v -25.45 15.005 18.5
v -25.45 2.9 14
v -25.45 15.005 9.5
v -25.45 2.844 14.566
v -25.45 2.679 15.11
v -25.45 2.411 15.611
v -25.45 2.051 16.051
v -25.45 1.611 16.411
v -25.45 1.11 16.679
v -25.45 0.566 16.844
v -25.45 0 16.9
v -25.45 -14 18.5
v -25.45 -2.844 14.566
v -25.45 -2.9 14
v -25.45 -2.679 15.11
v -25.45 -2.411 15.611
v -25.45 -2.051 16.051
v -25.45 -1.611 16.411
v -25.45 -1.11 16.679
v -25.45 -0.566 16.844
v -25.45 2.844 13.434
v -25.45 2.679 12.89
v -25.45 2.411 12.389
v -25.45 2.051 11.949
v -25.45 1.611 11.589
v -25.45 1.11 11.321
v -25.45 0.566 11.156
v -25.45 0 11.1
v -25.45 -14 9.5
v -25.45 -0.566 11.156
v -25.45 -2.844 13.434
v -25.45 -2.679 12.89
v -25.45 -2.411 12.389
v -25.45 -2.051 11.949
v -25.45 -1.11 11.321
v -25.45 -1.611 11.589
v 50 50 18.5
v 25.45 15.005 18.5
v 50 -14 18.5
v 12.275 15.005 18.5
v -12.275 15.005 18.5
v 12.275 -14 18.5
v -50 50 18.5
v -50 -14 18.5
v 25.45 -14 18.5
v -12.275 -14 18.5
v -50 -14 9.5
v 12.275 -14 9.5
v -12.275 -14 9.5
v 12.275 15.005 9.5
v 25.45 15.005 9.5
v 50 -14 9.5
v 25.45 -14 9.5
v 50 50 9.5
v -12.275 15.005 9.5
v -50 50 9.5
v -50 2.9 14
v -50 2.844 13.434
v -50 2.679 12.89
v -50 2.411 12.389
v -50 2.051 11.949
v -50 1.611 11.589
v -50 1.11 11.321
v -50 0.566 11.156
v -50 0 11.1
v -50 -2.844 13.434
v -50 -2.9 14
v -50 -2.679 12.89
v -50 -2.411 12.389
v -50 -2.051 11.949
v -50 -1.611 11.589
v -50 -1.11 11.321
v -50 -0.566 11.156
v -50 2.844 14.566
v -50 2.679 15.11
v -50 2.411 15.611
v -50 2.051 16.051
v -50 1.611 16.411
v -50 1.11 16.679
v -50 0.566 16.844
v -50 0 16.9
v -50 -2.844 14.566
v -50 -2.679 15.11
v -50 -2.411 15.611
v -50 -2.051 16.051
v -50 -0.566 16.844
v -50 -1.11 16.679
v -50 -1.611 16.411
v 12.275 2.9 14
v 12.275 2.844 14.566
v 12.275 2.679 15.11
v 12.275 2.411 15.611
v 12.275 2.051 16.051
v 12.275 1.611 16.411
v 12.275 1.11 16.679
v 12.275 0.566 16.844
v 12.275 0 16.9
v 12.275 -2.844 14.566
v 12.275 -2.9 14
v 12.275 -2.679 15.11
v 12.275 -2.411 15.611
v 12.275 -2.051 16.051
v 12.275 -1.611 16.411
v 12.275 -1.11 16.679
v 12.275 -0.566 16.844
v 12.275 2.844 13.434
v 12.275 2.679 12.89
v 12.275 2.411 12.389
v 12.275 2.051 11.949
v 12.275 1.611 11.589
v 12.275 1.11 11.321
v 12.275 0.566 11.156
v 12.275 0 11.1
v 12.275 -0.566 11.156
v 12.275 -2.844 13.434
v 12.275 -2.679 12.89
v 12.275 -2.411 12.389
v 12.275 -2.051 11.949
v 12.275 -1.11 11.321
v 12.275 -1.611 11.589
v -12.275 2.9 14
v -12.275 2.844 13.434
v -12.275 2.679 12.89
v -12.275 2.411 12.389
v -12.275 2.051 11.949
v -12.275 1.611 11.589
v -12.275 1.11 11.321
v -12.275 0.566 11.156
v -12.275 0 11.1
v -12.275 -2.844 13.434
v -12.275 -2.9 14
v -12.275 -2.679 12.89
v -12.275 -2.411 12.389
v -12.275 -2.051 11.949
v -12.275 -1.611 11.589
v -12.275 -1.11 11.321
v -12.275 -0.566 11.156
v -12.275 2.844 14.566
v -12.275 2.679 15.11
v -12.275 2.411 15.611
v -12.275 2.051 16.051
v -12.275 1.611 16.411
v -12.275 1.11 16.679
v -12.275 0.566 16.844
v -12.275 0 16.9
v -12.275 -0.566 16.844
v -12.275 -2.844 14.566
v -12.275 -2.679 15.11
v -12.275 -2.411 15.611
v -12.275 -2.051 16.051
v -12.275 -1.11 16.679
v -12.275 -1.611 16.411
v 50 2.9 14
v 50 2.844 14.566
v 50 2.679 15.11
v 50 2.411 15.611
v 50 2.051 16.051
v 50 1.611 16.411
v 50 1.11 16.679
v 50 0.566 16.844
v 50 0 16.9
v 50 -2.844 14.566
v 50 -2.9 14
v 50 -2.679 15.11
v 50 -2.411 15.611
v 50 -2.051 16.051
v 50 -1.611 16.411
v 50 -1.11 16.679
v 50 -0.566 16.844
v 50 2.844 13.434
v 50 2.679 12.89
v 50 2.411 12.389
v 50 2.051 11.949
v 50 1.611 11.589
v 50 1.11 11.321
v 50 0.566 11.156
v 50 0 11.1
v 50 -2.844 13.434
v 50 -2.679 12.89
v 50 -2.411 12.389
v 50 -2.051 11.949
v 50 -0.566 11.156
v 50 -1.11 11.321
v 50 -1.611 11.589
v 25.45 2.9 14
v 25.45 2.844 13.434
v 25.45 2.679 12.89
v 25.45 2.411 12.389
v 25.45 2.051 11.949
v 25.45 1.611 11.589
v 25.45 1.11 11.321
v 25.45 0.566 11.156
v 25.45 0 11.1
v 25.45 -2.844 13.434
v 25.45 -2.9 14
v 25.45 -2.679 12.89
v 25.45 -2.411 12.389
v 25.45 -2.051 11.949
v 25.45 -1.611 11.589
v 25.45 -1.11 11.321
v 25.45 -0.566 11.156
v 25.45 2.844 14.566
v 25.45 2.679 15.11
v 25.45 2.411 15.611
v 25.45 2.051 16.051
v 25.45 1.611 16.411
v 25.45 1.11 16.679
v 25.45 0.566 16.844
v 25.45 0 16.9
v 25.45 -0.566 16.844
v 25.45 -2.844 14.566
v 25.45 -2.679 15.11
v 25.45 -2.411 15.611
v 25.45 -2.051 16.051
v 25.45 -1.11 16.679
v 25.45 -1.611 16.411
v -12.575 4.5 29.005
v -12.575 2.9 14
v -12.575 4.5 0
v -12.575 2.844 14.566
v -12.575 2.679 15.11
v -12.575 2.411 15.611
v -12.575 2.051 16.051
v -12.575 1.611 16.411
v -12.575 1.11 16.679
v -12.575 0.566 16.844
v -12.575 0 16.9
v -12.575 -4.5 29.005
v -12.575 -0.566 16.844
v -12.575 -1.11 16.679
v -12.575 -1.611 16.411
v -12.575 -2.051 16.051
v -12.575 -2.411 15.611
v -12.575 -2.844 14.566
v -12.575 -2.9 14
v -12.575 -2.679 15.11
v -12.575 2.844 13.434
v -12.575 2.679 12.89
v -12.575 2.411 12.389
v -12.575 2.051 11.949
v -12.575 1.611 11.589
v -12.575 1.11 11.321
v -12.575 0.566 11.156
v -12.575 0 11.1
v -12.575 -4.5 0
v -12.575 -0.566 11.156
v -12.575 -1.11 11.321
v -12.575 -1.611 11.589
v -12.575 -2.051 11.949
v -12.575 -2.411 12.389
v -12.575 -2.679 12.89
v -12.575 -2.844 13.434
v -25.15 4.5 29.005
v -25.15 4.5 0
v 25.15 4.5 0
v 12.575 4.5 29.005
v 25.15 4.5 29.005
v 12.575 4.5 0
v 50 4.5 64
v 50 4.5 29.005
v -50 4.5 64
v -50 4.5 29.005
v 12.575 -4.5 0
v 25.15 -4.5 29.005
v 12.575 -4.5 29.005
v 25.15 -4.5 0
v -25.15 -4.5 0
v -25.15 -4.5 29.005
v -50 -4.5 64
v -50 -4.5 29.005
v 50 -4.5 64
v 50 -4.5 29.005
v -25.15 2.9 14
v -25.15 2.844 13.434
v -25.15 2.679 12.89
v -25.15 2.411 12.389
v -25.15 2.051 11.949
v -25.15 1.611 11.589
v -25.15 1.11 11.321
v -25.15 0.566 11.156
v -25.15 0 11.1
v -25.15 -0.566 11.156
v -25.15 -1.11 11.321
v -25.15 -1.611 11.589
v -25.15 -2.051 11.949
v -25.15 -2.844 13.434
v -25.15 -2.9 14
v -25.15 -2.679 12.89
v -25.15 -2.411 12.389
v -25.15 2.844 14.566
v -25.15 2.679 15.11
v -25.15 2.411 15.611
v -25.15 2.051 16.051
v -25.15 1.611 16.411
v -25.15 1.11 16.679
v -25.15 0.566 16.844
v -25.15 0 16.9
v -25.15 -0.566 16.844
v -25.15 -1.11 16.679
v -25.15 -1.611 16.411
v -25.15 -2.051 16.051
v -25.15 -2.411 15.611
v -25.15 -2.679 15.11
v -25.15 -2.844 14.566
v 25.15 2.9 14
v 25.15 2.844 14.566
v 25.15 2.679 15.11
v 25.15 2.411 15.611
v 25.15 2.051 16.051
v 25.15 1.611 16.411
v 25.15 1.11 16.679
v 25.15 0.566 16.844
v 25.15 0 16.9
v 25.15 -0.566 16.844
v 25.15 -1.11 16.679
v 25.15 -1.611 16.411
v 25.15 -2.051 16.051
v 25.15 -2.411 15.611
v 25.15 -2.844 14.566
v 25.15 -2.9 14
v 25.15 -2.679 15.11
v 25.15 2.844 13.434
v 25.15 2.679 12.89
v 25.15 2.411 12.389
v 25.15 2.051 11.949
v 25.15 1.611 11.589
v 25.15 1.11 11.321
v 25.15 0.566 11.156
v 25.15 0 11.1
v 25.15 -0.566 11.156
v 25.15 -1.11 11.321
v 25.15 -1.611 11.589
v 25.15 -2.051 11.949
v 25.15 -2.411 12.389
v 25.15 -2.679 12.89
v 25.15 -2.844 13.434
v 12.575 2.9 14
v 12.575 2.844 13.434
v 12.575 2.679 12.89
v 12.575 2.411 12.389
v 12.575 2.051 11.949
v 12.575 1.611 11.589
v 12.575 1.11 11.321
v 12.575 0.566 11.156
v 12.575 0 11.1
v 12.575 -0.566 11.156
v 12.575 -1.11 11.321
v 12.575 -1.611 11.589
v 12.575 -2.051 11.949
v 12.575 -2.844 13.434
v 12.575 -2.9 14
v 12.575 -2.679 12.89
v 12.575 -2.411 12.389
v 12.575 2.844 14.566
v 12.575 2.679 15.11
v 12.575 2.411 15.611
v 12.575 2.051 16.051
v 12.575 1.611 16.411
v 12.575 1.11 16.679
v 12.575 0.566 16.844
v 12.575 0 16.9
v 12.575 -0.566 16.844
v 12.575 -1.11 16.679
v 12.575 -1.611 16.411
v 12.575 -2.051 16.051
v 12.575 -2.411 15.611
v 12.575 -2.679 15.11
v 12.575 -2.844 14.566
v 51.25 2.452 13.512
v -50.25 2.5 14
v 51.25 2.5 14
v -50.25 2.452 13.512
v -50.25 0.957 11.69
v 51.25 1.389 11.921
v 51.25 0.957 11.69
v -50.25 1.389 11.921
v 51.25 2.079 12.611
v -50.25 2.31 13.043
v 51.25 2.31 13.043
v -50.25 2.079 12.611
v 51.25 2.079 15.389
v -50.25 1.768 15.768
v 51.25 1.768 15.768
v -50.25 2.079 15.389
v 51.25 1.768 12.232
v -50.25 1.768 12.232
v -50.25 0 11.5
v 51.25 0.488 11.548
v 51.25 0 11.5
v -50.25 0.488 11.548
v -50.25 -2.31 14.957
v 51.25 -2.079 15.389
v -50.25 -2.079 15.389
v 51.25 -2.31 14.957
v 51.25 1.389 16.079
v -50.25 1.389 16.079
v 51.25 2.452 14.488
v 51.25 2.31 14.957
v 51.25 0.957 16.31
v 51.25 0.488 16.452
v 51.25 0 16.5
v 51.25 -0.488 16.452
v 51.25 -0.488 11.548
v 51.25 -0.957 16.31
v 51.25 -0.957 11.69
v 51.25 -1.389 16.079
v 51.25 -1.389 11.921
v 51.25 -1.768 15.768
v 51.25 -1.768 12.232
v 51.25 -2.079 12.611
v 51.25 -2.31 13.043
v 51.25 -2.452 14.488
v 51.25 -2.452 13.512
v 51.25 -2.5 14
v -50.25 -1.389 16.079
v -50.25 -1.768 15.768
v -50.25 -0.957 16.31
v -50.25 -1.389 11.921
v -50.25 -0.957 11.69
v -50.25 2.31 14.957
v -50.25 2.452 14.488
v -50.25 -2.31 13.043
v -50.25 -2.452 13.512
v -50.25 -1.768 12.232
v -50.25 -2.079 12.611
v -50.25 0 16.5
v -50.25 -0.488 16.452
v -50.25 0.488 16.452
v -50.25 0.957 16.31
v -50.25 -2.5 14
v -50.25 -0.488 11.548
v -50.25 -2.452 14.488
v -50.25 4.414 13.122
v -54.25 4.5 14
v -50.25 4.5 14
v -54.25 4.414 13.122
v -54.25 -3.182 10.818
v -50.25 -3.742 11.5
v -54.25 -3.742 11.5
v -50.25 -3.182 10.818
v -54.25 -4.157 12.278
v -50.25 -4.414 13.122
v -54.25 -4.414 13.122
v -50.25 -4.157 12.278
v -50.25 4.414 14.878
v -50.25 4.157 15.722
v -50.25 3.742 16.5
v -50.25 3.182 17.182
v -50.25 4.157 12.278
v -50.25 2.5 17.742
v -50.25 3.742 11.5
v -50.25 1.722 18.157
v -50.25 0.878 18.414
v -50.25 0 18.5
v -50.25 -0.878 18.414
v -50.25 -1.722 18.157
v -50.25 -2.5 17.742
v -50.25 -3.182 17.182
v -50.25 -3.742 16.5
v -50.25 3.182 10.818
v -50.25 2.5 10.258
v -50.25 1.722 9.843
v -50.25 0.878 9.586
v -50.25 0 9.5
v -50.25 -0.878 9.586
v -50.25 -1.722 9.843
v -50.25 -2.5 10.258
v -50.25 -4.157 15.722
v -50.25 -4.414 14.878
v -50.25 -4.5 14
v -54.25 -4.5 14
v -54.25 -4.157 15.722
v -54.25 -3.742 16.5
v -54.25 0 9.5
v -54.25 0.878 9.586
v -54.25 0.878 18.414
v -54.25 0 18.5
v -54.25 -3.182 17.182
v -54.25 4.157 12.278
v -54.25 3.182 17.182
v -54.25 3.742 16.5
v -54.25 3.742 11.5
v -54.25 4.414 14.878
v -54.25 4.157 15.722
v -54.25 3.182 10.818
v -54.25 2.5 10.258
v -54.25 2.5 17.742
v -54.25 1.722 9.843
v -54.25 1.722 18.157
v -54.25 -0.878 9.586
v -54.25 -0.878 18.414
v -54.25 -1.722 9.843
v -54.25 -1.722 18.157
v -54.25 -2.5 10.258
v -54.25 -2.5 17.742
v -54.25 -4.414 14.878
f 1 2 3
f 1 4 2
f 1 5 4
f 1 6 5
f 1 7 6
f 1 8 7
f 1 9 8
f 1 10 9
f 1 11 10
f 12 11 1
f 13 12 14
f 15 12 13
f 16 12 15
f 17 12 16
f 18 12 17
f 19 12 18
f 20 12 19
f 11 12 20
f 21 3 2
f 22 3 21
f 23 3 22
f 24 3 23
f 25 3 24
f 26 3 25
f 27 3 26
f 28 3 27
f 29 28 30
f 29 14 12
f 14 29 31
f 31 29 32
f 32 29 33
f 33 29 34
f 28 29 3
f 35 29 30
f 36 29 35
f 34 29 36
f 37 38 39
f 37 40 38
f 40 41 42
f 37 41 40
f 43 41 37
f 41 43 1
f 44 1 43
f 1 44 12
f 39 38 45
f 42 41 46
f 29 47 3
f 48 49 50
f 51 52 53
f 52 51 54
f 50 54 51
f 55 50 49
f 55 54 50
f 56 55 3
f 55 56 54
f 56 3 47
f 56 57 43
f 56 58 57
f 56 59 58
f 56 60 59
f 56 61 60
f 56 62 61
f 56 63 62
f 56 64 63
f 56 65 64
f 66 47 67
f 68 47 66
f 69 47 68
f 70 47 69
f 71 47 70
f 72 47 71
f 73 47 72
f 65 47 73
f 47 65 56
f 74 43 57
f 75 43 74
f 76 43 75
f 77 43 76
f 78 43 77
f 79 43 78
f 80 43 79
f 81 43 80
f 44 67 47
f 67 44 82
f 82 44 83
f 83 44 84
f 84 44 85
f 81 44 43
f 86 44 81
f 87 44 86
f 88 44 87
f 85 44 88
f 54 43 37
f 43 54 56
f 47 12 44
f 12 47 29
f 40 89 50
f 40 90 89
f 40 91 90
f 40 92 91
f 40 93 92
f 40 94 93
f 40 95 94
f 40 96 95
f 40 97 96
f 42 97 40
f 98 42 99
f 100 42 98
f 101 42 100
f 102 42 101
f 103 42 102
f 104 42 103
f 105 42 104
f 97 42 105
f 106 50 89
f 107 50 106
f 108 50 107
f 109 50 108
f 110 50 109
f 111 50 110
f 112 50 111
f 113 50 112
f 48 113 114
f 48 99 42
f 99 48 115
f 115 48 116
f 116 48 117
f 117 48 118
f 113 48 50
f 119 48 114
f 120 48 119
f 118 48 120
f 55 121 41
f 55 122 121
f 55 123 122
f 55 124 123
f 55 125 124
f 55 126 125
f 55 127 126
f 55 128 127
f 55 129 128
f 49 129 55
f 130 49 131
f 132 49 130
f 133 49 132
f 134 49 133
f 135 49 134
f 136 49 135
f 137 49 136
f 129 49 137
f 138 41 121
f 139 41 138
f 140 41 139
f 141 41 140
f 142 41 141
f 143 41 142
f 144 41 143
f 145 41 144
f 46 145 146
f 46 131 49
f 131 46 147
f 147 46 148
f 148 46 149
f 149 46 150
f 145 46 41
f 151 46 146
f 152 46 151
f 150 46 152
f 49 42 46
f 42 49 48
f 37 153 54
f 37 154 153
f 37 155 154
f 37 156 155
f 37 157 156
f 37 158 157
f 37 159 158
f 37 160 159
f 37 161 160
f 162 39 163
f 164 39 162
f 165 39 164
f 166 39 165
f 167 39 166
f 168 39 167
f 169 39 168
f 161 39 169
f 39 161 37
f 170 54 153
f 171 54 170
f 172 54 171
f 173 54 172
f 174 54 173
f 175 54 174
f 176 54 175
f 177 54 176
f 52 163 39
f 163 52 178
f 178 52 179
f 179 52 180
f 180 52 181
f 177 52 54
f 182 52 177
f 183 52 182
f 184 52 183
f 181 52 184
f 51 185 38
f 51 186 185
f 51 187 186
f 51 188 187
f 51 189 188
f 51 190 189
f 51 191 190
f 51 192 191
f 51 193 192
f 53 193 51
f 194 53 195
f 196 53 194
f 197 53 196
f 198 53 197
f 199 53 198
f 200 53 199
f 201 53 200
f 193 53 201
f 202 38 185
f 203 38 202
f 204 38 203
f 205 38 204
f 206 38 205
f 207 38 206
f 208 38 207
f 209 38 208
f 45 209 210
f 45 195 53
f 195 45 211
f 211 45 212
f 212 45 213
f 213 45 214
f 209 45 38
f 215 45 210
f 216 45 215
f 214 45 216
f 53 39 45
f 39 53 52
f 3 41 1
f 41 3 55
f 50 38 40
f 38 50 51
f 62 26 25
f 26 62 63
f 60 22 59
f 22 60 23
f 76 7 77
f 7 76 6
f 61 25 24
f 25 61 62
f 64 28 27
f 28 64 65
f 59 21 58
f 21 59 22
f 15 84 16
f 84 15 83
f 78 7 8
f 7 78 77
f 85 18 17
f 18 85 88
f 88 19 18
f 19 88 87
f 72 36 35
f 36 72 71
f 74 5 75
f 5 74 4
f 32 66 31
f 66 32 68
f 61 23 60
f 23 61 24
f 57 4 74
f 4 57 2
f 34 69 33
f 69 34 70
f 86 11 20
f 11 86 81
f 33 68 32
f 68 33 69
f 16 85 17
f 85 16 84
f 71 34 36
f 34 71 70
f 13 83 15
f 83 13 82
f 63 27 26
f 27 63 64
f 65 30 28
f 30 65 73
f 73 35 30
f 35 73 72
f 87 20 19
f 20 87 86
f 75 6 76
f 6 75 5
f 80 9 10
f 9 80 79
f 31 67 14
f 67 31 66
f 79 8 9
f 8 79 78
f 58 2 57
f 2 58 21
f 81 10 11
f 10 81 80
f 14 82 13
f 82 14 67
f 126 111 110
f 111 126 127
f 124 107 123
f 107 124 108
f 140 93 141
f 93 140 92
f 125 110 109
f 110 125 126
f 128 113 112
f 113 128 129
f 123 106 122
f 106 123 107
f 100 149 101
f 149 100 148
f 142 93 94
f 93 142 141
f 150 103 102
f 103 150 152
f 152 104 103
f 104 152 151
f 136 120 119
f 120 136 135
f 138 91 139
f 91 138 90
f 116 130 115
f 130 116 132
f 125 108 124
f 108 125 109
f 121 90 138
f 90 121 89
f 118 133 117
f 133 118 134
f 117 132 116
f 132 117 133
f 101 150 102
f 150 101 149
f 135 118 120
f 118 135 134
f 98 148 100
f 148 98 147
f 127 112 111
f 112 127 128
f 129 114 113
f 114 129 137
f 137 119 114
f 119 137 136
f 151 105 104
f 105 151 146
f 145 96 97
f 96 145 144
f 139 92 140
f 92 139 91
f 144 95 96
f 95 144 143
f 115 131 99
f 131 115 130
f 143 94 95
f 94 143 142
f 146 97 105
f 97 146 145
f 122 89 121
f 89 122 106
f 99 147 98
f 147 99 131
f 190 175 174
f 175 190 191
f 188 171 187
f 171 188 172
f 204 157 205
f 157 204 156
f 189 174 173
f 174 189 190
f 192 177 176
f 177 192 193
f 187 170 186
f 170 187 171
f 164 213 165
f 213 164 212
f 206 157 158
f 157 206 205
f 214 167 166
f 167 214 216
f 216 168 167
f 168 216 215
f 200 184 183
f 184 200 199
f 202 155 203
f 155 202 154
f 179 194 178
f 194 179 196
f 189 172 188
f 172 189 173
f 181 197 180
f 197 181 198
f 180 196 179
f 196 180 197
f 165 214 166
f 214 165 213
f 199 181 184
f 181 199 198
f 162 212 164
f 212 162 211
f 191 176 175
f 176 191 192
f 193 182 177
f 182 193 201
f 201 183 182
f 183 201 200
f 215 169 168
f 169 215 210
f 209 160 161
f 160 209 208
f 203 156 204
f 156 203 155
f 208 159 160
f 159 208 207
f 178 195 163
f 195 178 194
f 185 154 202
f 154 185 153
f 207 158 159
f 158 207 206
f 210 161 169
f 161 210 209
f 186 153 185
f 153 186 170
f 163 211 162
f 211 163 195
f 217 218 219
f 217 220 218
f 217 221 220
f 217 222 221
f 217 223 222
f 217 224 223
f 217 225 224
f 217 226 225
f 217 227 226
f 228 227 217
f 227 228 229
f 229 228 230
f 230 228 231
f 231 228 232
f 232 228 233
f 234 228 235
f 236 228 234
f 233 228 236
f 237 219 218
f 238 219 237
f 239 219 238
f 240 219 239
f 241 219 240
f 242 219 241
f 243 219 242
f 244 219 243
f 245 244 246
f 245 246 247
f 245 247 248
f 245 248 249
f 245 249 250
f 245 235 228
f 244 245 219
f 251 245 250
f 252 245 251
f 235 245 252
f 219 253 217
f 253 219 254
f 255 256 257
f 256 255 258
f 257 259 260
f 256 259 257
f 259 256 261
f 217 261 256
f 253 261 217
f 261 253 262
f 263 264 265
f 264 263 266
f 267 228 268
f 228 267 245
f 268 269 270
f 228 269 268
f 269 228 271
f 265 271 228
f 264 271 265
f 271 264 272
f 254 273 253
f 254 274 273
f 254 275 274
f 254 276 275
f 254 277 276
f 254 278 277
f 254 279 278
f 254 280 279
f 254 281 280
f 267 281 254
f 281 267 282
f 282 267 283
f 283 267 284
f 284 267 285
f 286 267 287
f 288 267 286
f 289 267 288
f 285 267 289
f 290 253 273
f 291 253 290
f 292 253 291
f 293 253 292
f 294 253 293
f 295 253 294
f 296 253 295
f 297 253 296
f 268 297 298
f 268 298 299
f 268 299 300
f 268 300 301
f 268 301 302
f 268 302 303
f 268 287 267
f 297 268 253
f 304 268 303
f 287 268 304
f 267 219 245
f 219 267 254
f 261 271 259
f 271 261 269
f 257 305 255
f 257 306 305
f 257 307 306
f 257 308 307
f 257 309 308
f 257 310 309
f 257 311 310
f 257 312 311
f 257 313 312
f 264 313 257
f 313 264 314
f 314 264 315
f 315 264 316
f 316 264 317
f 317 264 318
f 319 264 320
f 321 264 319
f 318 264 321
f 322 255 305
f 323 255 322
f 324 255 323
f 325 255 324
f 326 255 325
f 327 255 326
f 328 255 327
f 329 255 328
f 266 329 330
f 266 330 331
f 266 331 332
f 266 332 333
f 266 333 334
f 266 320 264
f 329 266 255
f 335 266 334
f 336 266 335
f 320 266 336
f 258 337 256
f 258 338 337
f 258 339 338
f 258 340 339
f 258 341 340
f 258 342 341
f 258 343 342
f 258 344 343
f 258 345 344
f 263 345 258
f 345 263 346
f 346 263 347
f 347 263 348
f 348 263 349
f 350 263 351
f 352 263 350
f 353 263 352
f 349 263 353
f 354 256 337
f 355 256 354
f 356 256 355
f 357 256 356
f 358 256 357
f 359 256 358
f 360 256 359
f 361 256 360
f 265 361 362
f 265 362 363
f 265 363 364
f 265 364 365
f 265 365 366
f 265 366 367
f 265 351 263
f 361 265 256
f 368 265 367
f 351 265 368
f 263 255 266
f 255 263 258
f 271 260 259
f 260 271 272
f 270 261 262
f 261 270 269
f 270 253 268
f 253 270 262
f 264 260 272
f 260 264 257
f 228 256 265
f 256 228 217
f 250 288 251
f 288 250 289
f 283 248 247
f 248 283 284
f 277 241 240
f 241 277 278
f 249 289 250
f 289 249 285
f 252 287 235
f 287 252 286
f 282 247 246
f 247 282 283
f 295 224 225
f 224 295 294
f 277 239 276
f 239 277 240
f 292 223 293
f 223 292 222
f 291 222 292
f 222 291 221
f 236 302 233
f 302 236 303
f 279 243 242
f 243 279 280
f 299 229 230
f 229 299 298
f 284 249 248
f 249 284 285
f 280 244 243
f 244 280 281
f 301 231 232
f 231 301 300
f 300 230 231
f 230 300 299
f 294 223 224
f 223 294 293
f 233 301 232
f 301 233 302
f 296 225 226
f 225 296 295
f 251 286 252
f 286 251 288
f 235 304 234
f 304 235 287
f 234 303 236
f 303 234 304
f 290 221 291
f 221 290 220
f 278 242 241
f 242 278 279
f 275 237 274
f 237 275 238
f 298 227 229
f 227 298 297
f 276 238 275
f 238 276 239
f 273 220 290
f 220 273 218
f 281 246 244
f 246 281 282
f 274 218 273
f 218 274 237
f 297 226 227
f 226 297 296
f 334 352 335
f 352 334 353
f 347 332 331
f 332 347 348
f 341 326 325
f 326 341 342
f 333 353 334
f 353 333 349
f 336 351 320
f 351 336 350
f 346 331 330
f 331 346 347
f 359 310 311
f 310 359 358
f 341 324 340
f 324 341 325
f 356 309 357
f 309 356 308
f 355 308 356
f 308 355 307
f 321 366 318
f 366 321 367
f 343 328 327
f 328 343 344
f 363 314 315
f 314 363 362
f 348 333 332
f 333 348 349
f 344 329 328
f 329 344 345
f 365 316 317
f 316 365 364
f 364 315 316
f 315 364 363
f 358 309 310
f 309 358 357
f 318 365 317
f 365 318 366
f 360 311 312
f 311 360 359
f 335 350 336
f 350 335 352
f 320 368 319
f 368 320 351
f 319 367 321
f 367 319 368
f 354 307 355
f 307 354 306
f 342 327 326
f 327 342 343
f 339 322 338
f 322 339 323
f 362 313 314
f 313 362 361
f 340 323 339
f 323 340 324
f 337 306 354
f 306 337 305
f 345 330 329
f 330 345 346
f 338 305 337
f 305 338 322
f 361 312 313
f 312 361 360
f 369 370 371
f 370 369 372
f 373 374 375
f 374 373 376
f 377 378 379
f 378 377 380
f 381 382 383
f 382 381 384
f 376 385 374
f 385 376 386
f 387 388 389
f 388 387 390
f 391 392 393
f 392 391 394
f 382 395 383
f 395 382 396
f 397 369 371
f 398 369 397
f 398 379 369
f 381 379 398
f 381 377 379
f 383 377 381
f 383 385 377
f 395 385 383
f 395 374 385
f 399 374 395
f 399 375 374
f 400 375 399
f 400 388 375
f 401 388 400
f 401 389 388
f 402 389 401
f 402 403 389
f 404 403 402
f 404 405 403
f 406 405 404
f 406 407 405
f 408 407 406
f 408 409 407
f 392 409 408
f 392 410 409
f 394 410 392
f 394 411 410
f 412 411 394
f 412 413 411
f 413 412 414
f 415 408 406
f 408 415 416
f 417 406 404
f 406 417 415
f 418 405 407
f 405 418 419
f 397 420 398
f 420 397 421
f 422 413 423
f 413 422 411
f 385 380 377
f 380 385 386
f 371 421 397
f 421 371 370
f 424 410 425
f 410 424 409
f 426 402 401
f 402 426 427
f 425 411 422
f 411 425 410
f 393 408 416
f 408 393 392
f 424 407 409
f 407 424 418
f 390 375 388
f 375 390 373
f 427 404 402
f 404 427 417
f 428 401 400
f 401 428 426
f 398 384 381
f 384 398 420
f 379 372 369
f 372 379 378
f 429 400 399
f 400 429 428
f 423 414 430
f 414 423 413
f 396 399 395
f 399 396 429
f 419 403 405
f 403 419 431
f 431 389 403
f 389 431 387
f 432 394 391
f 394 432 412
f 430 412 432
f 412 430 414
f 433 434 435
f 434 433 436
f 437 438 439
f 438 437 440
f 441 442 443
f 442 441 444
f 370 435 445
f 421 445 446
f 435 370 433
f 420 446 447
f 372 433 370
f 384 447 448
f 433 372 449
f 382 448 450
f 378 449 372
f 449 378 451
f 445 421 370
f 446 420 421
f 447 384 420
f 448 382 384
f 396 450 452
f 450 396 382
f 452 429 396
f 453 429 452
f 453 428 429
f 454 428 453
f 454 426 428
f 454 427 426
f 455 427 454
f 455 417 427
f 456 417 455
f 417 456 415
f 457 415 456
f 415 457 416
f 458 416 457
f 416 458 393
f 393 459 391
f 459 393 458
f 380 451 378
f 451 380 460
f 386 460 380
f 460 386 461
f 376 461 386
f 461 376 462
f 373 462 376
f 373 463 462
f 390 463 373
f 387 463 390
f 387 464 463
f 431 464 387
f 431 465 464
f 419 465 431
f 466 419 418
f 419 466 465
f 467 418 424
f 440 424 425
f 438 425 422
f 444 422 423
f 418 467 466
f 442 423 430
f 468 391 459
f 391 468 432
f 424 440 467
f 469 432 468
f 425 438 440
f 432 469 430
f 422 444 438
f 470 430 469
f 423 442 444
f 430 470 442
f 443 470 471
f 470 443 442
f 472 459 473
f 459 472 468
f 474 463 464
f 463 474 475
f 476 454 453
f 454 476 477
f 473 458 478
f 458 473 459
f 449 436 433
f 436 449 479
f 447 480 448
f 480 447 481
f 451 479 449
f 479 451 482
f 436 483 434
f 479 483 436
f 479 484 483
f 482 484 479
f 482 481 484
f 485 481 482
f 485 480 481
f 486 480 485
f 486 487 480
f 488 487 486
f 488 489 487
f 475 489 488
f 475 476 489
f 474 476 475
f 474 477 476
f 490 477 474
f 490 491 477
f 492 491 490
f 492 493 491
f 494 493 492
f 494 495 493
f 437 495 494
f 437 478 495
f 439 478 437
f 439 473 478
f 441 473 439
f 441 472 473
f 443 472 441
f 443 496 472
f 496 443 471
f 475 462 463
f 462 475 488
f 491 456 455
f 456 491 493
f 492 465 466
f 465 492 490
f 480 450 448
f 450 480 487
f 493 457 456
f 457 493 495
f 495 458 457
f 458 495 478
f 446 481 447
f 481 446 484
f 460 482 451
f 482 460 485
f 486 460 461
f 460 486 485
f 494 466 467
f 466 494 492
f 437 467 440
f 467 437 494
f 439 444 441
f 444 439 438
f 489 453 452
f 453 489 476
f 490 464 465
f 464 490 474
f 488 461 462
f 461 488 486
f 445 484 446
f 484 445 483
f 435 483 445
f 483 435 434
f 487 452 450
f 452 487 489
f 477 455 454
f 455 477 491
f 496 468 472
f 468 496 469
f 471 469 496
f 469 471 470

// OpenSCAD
$fn = 32;

// ------------------------------------------------------------------------
// Butt hinge: hinge 100 mm, leaf swung 270 deg
// Every part is its own module, assembly() places every instance.
// ------------------------------------------------------------------------

// --- part 1 ---
module hinge_base() {
  difference() {
    union() {
      translate([-50, -14, -4.5]) cube([24.55, 64, 9]);
      translate([-12.275, -14, -4.5]) cube([24.55, 64, 9]);
      translate([25.45, -14, -4.5]) cube([24.55, 64, 9]);
      translate([-50, 15.005, -4.5]) cube([100, 34.995, 9]);
    }
    translate([-37.725, 0, 0]) rotate([0, 90, 0]) cylinder(h = 26.55, d = 5.8, center = true);
    translate([0, 0, 0]) rotate([0, 90, 0]) cylinder(h = 26.55, d = 5.8, center = true);
    translate([37.725, 0, 0]) rotate([0, 90, 0]) cylinder(h = 26.55, d = 5.8, center = true);
  }
}

// --- part 2 ---
module hinge_mover() {
  difference() {
    union() {
      translate([-25.15, -50, -4.5]) cube([12.575, 64, 9]);
      translate([12.575, -50, -4.5]) cube([12.575, 64, 9]);
      translate([-50, -50, -4.5]) cube([100, 34.995, 9]);
    }
    translate([-18.863, 0, 0]) rotate([0, 90, 0]) cylinder(h = 14.575, d = 5.8, center = true);
    translate([18.863, 0, 0]) rotate([0, 90, 0]) cylinder(h = 14.575, d = 5.8, center = true);
  }
}

// --- part 3 ---
module hinge_pin() {
  rotate([0, 90, 0]) cylinder(h = 102.5, d = 5, center = true);
  translate([-54.25, 0, 0]) rotate([0, 90, 0]) cylinder(h = 4, d = 9);
}

// --- assembly ---
module assembly() {
  color([0.80, 0.24, 0.20]) translate([0, 0, 14]) rotate([0, 0, 0]) hinge_base();
  color([0.20, 0.45, 0.75]) translate([0, 0, 14]) rotate([270, 0, 0]) hinge_mover();
  color([0.25, 0.62, 0.32]) translate([0, 0, 14]) rotate([0, 0, 0]) hinge_pin();
}

assembly();
